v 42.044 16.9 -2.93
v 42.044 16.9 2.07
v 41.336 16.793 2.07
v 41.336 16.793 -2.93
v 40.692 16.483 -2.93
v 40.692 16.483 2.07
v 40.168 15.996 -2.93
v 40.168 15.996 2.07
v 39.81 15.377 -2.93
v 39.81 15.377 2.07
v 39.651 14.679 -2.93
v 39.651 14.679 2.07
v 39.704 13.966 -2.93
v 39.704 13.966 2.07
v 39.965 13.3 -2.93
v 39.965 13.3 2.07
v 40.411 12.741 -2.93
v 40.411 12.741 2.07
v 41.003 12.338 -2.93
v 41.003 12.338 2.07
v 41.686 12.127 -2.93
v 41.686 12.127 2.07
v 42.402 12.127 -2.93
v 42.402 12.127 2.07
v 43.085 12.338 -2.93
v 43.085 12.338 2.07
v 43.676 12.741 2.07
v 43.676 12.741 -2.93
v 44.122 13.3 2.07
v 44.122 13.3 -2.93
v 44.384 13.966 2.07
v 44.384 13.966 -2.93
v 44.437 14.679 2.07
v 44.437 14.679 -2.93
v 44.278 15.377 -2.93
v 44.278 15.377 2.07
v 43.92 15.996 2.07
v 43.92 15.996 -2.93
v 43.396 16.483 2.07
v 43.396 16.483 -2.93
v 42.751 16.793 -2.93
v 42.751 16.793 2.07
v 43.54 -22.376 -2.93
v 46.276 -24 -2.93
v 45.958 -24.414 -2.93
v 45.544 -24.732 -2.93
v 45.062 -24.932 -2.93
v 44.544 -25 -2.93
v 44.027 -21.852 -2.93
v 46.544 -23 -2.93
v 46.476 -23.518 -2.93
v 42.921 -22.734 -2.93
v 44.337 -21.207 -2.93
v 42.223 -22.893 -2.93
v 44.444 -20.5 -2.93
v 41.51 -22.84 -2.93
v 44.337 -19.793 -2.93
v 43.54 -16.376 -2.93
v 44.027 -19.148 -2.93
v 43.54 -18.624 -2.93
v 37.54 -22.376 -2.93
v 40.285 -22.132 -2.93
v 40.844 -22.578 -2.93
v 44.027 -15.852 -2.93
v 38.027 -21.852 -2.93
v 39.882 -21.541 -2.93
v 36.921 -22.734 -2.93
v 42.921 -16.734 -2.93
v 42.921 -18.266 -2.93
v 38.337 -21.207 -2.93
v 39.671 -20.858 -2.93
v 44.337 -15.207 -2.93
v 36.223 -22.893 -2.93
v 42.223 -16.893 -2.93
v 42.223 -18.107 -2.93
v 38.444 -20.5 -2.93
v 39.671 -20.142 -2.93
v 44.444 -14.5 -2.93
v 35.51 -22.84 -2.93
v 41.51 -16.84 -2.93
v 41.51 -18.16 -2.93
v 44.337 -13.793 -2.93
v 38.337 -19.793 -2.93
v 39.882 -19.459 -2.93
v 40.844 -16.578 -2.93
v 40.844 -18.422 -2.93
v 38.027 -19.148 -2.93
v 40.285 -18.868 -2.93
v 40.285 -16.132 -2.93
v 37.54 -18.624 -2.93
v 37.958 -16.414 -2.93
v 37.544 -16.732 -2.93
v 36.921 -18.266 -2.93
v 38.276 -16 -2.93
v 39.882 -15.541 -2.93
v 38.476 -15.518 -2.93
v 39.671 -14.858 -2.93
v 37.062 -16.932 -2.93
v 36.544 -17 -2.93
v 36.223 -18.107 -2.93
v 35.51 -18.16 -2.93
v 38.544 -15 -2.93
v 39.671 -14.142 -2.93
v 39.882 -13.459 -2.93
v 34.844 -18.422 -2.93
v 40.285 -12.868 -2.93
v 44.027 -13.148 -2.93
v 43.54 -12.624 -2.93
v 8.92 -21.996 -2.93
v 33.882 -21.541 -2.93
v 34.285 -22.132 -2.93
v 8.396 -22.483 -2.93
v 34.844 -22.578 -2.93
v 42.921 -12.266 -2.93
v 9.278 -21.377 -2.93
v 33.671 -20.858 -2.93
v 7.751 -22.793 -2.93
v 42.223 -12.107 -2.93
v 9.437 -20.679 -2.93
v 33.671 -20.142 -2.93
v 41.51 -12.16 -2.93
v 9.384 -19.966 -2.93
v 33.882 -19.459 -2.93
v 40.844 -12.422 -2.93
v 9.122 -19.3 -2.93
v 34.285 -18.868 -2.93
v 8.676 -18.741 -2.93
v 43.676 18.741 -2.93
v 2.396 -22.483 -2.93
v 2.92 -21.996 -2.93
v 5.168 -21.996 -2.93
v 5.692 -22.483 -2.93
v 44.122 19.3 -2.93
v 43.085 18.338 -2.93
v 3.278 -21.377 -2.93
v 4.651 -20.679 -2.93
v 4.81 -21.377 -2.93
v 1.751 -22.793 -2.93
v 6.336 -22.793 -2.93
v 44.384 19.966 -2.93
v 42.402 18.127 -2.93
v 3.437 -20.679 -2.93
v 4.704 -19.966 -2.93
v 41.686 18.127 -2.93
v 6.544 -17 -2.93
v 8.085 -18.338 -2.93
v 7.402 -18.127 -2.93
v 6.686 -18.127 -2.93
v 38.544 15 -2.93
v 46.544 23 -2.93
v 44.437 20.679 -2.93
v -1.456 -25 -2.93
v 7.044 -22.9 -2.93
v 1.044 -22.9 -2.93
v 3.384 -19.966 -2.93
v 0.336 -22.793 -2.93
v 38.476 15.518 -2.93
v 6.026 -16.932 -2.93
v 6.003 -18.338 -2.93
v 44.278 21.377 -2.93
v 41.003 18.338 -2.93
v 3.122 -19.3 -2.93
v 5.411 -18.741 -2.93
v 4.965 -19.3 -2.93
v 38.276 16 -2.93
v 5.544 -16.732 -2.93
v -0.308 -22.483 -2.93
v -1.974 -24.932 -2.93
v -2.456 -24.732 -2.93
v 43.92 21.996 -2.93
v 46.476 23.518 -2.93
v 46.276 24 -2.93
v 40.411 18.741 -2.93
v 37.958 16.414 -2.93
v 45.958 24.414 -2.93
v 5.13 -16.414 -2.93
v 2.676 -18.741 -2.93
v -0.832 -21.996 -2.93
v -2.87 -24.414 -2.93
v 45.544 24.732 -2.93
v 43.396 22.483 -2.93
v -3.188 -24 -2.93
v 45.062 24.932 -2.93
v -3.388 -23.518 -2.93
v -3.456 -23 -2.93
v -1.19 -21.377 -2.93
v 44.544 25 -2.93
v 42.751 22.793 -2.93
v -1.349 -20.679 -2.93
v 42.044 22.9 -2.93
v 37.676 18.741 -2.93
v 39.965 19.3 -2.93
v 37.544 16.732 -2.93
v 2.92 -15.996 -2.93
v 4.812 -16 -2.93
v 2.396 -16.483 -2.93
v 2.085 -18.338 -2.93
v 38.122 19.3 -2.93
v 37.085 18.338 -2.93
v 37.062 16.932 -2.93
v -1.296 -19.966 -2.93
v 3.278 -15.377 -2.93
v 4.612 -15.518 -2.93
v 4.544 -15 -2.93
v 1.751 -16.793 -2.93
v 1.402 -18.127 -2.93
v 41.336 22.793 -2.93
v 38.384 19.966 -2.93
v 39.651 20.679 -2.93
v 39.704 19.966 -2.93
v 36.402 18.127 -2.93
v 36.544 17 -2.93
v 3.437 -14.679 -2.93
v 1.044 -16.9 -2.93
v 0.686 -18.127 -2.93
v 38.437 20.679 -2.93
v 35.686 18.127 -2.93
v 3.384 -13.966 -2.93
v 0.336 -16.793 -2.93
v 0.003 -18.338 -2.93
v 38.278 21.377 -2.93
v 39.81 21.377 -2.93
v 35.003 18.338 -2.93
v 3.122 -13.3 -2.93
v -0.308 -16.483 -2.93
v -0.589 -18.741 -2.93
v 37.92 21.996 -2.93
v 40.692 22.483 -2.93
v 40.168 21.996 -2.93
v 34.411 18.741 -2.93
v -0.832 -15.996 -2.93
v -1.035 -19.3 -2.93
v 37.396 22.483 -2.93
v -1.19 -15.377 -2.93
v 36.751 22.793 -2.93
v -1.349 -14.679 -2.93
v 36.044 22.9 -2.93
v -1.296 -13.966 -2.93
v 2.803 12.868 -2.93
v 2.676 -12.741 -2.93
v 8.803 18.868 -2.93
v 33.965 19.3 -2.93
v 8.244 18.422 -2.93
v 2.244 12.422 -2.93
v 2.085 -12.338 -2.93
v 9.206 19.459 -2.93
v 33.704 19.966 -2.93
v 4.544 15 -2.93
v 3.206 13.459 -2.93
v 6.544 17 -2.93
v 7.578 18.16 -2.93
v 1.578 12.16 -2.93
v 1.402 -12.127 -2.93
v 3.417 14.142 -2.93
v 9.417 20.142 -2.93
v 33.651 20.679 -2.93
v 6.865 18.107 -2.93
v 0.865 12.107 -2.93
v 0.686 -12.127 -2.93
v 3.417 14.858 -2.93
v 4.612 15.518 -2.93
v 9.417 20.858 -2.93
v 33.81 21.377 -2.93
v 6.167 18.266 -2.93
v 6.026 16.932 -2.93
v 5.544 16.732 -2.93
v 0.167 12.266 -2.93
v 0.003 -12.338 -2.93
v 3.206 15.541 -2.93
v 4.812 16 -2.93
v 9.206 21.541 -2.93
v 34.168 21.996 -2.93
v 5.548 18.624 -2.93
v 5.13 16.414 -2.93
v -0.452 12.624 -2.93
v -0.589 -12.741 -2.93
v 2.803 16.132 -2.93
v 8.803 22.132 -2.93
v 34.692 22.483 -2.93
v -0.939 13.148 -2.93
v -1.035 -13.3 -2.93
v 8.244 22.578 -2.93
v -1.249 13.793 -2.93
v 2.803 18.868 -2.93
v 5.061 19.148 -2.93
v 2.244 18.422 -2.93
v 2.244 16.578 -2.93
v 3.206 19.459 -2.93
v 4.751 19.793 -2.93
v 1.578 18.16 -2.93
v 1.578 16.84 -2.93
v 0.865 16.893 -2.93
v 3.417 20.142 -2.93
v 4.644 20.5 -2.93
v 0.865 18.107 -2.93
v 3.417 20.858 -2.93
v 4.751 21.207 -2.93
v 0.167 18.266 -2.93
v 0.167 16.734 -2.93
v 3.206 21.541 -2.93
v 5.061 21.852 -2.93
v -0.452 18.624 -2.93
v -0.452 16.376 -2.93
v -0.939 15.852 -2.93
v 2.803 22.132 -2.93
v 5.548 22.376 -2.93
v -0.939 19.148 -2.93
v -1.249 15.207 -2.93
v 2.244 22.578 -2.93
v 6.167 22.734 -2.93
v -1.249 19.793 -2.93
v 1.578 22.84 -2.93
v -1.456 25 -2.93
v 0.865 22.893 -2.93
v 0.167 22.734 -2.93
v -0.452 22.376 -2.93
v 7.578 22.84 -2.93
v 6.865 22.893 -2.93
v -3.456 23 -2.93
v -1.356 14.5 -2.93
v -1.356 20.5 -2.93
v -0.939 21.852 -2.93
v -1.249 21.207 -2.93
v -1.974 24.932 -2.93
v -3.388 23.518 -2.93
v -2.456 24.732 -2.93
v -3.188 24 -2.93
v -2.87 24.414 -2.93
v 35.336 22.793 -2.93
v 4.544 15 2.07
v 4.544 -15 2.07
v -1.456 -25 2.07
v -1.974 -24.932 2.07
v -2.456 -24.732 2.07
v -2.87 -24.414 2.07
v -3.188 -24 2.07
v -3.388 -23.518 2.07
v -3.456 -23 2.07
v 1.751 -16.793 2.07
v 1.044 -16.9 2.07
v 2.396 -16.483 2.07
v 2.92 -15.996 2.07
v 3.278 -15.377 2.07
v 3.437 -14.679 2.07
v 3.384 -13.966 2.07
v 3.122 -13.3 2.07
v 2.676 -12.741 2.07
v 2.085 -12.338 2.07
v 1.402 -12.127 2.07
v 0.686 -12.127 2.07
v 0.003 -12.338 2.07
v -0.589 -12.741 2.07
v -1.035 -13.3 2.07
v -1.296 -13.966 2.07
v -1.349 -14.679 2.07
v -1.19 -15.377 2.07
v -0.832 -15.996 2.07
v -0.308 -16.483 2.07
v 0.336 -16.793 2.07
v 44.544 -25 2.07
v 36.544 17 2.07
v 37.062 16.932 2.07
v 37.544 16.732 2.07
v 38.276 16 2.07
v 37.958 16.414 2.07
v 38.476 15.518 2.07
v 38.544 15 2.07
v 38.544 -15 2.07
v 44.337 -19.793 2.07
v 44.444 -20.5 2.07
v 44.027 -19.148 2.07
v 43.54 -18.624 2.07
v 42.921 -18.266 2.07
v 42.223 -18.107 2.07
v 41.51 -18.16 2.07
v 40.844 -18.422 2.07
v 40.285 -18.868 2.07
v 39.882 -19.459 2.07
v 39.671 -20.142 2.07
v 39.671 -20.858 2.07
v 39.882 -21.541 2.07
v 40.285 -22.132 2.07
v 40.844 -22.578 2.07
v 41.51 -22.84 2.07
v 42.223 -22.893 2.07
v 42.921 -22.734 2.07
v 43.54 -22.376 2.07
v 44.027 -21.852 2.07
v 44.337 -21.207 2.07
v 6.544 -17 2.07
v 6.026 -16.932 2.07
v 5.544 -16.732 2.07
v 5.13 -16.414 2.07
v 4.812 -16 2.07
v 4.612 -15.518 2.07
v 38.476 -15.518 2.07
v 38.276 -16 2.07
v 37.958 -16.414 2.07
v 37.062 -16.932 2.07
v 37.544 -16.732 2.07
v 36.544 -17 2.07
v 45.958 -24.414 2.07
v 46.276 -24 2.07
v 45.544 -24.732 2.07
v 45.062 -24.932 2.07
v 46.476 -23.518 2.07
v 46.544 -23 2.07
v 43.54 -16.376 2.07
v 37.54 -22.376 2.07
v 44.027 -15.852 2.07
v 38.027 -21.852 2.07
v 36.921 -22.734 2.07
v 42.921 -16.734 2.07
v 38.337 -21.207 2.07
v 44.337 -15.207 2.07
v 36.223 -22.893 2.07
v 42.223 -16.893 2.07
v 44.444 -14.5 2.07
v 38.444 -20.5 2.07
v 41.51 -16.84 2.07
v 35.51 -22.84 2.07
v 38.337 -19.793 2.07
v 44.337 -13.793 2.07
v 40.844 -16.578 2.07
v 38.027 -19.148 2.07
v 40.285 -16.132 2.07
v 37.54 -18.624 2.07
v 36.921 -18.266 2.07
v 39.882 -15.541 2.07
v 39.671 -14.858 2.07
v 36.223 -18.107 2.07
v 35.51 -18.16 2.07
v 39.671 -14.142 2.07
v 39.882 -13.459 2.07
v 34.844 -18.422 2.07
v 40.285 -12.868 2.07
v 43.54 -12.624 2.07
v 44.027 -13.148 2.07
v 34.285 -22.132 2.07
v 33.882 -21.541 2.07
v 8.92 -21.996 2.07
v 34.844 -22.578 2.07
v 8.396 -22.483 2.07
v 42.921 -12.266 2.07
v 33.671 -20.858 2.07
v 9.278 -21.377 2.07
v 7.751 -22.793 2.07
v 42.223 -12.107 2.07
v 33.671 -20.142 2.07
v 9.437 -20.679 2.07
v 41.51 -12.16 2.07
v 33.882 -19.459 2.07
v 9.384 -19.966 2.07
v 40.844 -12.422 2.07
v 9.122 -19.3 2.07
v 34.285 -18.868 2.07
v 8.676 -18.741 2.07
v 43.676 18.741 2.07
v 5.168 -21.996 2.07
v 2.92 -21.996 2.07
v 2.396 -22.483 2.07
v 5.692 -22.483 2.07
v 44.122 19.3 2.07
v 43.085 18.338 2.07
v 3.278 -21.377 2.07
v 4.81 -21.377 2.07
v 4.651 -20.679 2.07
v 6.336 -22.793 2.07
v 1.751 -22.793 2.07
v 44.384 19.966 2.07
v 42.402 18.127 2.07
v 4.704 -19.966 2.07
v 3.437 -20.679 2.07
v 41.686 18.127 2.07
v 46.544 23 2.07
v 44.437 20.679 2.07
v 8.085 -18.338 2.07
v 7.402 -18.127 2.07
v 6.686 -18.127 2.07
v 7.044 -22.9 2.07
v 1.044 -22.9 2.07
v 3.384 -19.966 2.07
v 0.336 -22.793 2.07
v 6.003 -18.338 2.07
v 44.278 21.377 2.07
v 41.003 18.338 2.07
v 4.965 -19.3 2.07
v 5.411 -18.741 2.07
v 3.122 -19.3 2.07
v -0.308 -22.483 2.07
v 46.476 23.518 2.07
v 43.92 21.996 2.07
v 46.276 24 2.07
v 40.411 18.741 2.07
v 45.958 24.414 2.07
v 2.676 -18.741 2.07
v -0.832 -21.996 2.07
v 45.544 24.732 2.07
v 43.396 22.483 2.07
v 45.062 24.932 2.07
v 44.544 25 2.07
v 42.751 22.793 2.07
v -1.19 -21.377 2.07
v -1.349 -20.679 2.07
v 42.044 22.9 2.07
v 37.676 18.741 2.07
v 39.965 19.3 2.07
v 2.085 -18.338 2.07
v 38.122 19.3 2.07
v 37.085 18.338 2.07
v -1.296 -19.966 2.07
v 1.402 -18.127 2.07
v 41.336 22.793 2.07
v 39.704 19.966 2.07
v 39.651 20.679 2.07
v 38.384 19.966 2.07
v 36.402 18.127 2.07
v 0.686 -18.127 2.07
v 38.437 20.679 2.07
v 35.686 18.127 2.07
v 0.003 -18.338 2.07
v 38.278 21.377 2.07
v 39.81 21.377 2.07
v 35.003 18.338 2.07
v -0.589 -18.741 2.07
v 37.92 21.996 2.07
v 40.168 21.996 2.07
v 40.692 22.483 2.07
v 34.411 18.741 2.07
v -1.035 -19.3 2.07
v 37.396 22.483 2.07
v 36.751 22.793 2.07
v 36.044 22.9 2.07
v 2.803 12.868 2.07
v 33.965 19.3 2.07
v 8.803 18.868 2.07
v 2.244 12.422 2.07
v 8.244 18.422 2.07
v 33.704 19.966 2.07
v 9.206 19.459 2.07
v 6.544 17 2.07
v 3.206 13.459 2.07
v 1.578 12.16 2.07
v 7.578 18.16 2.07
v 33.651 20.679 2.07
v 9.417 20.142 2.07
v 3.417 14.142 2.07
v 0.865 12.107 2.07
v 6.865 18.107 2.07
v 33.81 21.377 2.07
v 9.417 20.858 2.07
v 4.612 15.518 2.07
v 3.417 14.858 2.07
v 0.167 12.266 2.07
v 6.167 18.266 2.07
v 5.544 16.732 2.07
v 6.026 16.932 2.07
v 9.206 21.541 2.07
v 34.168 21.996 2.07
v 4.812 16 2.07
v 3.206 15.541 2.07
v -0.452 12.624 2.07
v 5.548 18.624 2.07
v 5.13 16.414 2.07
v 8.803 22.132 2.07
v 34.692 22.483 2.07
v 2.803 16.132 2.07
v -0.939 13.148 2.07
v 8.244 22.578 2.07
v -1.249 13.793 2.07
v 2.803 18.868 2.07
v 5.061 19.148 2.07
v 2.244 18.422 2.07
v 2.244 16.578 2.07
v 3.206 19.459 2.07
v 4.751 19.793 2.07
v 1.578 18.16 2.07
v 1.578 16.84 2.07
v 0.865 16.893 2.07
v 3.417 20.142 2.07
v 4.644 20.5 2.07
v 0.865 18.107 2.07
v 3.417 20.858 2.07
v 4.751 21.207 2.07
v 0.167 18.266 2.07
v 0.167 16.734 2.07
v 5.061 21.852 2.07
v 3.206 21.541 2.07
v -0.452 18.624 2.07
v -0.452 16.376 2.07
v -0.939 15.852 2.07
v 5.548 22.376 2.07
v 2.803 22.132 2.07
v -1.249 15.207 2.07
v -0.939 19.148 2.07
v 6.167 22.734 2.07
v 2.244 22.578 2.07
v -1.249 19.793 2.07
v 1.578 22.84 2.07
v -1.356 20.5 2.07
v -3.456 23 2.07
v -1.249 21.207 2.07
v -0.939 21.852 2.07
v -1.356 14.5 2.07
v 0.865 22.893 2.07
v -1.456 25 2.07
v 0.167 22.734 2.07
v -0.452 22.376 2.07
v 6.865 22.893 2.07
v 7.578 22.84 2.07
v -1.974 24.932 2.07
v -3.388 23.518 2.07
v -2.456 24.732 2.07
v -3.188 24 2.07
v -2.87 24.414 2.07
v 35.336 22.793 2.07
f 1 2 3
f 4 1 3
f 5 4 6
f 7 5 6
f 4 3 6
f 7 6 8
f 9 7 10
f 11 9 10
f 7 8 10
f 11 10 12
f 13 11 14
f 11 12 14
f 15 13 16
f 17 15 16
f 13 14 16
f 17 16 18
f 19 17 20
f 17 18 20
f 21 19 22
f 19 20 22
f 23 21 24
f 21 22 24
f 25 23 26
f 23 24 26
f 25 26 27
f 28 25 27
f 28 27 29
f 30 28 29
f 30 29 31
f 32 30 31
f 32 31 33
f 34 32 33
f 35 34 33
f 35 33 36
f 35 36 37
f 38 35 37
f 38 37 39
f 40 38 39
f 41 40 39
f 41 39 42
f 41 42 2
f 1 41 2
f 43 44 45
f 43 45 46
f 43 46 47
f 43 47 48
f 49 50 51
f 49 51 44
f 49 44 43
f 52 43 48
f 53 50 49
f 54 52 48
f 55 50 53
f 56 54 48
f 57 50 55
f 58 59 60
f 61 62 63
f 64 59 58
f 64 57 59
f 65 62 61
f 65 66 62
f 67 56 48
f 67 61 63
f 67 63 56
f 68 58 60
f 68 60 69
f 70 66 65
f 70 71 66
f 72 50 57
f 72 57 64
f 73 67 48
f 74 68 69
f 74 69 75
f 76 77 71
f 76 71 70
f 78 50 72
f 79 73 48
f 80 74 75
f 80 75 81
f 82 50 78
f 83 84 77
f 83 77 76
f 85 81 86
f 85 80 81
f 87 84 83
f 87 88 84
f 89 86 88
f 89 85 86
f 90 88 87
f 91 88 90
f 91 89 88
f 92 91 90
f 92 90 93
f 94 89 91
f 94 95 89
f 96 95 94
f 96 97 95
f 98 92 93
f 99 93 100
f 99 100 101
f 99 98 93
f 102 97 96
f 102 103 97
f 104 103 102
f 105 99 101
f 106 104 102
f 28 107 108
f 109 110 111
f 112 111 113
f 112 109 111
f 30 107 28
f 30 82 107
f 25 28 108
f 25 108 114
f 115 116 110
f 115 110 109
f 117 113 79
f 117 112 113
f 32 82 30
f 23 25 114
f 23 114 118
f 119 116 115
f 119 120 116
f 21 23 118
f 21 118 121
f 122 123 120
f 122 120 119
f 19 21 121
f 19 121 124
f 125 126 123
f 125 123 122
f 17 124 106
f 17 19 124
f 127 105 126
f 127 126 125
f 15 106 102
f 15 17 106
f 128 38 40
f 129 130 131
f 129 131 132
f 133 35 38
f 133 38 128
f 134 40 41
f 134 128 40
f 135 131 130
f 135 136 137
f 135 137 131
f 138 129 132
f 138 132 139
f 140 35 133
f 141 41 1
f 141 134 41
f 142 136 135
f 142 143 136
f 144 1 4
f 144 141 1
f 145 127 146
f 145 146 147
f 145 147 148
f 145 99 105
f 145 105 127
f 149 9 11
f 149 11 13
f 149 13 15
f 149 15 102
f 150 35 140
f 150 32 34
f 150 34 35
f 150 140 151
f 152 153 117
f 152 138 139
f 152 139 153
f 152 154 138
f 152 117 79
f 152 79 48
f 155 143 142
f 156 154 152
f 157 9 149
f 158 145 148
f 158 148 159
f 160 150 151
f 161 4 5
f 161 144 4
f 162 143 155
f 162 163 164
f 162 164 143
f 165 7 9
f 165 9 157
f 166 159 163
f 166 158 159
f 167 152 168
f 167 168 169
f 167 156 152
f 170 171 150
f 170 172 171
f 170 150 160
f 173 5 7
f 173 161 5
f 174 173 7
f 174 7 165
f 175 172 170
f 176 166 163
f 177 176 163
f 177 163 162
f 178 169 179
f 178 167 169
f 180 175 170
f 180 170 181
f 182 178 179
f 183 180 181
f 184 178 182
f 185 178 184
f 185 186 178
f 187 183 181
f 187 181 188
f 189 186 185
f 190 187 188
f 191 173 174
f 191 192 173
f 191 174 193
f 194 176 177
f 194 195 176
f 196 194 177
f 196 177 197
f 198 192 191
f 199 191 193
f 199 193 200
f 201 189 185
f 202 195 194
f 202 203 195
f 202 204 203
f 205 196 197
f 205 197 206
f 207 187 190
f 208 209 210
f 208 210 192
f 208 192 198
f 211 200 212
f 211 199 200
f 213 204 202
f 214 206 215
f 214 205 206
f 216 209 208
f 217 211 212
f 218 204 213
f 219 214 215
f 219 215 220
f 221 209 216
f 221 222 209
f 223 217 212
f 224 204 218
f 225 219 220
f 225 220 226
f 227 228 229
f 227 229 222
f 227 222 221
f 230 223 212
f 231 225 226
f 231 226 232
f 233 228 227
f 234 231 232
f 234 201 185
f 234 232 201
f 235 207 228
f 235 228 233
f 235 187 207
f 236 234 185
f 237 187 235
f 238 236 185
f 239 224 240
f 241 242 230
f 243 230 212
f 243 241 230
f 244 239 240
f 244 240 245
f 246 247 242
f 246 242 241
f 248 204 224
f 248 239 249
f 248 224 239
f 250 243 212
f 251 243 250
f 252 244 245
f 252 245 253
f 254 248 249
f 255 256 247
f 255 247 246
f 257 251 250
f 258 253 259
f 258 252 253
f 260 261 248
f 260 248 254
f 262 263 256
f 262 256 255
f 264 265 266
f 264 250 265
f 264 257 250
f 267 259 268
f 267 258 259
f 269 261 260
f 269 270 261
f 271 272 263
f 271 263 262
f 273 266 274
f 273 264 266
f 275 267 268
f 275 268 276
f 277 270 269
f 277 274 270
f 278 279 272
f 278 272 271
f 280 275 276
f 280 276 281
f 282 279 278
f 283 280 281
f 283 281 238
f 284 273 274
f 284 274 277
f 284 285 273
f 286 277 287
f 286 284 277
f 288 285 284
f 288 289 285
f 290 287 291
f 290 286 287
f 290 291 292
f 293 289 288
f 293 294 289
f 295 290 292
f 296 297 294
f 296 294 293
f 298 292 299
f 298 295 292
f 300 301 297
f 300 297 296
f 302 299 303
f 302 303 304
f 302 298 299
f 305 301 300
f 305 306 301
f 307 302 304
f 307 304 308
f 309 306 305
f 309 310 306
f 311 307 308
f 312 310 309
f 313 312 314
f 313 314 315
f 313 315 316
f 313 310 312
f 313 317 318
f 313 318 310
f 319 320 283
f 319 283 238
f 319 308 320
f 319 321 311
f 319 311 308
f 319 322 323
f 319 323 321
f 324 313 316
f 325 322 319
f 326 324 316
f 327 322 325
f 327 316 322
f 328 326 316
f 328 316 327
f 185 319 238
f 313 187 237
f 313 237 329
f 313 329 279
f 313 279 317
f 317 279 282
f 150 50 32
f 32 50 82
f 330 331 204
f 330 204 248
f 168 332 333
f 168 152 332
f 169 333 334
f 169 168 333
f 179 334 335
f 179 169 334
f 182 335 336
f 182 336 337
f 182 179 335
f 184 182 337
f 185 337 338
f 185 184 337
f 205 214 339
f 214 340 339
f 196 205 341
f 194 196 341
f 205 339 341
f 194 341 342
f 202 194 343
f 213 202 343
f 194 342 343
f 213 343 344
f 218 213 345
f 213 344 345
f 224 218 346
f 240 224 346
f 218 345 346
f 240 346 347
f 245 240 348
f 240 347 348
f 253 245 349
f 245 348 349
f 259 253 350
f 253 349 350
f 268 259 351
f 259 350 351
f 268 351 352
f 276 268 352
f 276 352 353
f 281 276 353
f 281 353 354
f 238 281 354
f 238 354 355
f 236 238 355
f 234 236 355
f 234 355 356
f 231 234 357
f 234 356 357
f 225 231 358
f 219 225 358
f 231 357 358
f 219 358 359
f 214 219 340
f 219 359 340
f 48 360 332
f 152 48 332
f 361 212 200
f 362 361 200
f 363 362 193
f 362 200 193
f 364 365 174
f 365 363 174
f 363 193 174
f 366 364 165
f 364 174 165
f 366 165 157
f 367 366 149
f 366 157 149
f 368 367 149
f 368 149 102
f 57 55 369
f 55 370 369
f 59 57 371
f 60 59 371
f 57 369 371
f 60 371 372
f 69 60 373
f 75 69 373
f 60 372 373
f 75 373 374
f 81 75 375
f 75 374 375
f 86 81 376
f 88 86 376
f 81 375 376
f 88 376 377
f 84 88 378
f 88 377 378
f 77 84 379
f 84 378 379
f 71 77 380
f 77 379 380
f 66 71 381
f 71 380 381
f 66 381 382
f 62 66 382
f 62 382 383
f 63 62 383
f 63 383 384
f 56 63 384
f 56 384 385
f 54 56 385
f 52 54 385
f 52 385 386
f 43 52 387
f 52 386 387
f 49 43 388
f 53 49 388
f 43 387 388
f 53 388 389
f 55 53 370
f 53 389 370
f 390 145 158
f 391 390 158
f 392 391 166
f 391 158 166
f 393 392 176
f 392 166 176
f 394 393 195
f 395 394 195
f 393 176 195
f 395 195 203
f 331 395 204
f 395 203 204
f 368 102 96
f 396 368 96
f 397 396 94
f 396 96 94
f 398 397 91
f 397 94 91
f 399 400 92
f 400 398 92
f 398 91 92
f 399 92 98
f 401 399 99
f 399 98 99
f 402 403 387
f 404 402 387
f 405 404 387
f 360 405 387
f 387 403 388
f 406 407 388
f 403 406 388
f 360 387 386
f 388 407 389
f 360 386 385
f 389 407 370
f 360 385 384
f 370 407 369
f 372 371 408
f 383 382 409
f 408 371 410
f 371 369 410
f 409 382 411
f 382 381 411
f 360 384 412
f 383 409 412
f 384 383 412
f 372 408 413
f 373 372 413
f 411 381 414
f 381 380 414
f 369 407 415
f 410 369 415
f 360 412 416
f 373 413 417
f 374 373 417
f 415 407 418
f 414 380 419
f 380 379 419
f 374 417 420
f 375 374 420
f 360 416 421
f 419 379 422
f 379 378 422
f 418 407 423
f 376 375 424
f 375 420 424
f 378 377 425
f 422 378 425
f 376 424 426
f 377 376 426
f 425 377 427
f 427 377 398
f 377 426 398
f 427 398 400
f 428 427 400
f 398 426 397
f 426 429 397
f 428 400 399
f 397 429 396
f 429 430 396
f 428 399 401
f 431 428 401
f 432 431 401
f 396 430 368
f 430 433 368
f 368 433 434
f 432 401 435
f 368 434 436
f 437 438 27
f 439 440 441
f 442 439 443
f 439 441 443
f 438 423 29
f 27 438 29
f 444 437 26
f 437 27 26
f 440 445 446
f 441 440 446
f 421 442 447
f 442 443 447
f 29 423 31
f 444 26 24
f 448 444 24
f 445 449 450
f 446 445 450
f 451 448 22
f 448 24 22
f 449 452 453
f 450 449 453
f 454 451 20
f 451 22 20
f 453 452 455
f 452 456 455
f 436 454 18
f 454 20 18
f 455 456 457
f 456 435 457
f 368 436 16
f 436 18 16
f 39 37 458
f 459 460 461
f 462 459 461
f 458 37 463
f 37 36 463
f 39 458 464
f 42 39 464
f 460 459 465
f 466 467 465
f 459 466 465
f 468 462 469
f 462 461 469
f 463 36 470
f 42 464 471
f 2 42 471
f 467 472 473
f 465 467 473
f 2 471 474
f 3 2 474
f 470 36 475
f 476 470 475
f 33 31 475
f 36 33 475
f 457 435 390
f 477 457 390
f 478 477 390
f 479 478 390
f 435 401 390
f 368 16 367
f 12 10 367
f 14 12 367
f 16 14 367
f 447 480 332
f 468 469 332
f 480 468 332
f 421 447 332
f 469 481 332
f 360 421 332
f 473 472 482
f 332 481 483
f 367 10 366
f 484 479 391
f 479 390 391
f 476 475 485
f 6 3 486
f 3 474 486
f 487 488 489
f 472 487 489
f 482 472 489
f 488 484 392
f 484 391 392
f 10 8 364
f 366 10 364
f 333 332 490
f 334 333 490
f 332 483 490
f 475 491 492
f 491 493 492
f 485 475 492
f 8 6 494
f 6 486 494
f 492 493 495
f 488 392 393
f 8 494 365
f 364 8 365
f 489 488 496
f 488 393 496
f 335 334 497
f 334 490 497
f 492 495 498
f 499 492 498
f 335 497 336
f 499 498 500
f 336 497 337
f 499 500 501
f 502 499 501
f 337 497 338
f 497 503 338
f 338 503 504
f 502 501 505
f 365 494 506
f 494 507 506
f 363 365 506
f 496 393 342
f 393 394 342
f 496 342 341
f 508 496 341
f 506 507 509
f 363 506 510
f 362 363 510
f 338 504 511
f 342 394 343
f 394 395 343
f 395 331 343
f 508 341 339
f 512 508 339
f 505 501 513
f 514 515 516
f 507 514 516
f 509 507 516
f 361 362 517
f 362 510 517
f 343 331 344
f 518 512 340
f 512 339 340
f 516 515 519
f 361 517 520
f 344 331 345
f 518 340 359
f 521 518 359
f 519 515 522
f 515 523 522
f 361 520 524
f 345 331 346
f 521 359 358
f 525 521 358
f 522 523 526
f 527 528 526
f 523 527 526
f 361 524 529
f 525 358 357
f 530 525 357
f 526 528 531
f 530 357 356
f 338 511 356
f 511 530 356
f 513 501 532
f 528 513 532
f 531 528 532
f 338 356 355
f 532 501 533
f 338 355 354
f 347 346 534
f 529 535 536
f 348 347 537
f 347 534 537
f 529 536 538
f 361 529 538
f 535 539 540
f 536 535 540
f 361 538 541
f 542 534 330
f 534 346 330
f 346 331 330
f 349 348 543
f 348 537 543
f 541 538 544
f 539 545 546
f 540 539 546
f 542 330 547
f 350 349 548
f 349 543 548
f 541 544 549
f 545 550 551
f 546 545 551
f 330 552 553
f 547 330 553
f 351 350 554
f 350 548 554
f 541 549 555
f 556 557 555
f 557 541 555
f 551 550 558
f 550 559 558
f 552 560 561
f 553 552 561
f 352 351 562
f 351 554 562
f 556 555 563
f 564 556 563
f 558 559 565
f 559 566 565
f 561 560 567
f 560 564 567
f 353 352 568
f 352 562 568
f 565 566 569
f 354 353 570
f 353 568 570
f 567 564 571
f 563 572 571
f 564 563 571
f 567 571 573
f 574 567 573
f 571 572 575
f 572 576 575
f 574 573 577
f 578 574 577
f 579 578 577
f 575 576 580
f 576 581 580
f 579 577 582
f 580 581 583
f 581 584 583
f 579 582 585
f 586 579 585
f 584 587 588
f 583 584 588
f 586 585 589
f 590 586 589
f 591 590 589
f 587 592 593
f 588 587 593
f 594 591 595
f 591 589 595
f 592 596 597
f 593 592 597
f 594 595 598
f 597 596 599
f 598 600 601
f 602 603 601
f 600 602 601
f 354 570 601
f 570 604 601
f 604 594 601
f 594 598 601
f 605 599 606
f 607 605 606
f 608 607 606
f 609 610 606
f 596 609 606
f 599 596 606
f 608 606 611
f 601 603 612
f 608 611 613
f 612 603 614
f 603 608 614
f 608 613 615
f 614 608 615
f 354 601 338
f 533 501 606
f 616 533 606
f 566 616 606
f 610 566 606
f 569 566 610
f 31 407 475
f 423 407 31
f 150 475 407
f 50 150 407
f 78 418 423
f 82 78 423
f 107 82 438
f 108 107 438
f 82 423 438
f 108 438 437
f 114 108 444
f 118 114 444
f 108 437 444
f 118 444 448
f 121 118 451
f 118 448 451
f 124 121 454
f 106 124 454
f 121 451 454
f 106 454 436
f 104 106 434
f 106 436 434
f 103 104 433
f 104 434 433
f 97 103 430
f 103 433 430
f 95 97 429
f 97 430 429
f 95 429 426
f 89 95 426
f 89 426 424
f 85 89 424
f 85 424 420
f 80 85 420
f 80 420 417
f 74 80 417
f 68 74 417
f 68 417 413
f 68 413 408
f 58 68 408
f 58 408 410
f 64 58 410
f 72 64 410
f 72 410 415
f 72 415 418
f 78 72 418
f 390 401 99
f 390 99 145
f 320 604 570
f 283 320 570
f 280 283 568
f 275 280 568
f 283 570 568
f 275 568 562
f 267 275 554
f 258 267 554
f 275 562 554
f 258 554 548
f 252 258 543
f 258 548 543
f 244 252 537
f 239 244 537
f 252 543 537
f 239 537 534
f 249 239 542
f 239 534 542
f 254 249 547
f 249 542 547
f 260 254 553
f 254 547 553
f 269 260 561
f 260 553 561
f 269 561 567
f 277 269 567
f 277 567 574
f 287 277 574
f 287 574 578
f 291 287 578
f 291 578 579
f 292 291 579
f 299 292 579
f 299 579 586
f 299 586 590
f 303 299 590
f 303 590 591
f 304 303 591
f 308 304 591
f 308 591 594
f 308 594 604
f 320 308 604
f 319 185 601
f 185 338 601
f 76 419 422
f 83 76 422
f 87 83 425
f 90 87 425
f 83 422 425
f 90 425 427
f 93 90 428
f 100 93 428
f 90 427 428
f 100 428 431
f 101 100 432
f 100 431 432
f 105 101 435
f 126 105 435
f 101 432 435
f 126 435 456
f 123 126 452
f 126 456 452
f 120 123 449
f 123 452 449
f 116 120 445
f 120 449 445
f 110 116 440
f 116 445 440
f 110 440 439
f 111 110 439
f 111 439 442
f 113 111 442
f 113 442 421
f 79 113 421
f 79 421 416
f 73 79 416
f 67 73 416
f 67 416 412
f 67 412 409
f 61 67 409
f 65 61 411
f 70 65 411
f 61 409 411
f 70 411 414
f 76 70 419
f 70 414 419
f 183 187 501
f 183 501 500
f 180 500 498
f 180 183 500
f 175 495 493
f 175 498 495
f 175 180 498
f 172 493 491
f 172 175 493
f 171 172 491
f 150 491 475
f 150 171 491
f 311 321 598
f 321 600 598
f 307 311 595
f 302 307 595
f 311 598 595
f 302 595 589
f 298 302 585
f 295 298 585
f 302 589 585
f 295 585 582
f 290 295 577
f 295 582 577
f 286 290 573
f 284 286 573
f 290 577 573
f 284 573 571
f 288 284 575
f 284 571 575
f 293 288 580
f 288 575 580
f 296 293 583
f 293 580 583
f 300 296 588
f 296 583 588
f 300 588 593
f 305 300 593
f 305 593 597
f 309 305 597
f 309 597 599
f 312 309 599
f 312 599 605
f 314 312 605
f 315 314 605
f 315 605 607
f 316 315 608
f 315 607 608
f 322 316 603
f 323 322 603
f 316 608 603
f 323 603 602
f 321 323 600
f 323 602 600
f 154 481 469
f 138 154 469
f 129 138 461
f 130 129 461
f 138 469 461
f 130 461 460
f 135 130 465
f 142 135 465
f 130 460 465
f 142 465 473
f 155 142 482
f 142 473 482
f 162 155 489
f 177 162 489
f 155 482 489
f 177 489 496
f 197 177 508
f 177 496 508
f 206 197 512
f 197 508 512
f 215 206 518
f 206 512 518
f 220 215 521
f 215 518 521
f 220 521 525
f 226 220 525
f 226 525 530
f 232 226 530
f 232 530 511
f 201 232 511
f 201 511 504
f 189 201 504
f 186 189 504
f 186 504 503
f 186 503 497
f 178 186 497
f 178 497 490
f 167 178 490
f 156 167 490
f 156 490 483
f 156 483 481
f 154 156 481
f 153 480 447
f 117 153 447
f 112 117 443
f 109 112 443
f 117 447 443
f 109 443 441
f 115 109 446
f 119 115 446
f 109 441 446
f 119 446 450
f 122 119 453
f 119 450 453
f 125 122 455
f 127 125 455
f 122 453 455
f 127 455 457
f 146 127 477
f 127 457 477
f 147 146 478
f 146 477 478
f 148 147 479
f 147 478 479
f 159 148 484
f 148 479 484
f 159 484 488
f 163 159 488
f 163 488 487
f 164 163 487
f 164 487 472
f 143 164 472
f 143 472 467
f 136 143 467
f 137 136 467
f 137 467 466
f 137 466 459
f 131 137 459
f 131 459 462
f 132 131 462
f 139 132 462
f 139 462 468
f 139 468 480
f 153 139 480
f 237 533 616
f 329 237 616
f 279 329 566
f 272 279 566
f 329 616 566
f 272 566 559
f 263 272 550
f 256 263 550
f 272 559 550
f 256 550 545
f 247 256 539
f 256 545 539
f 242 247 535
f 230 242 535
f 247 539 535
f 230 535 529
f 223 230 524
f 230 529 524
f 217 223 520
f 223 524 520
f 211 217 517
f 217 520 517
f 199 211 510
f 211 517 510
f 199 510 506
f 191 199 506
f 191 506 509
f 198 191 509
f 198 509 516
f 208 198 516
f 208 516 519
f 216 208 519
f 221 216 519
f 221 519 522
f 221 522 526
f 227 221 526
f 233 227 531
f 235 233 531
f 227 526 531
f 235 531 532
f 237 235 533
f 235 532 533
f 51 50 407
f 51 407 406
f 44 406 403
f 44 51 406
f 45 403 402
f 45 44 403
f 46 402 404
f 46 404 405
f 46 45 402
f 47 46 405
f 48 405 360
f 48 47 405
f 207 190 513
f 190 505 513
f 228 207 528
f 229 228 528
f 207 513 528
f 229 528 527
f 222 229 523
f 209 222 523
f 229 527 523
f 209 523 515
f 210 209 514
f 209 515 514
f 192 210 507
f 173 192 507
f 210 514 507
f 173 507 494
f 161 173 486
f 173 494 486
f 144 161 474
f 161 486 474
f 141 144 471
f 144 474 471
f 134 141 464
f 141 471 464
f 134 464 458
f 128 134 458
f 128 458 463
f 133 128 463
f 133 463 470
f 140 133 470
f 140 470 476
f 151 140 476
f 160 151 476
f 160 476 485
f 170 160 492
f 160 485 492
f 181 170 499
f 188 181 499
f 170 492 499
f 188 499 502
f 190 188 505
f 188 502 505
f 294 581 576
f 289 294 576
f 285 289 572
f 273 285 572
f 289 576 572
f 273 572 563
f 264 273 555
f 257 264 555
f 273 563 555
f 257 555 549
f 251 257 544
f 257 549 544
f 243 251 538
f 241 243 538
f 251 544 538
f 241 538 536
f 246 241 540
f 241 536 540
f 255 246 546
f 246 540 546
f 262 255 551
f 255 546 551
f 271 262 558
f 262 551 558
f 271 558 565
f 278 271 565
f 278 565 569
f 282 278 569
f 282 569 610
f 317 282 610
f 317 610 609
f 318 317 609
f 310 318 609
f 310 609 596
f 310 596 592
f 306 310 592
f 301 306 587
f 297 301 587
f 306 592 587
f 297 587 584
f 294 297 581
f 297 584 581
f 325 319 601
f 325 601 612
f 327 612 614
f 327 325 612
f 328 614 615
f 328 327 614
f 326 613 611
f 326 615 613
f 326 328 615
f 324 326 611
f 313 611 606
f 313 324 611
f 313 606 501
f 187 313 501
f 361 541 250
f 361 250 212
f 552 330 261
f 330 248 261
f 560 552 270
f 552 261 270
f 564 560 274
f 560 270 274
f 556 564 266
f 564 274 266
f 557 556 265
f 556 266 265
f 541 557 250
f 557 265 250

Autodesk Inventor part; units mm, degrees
ref_plane "YZ Plane" through (0, 0, 0) normal (1, 0, 0) x (0, 1, 0)
ref_plane "XZ Plane" through (0, 0, 0) normal (0, 1, 0) x (-1, 0, 0)
ref_plane "XY Plane" through (0, 0, 0) normal (0, 0, 1) x (1, 0, 0)
ref_plane "Arbeitsebene1" through (21.5439, 0, 2.0695) normal (0, 0, -1) x (-1, 0, 0)
sketch "Skizze1" plane through (21.5439, 0, 2.0695) normal (0, 0, -1) x (-1, 0, 0)
  line L0 (-25, -25) -> (25, -25)
  line L1 (25, -25) -> (25, 25)
  line L2 (25, 25) -> (-25, 25)
  line L3 (-25, 25) -> (-25, -25)
  line L4 (-25, -25) -> (25, 25) construction
  line L5 (25, -25) -> (-25, 25) construction
  line L6 (-17, -17) -> (17, -17)
  line L7 (17, -17) -> (17, 17)
  line L8 (17, 17) -> (-17, 17)
  line L9 (-17, 17) -> (-17, -17)
  line L10 (-17, -17) -> (17, 17) construction
  line L11 (17, -17) -> (-17, 17) construction
  point P0 (21.5439, 0)
  point P1 (0, 0)
  point P2 (0, 0)
  dimension "d0" = 50
  dimension "d1" = 50
  dimension "d2" = 34
  dimension "d3" = 34
extrude "Extrusion1" add sketch "Skizze1" along normal blind 5
sketch "Skizze2" plane through (21.5439, 0, -2.9305) normal (0, 0, -1) x (-1, 0, 0)
  line L0 (21, 17) -> (21, -17) projected
  line L1 (25, -25) -> (25, 25) projected
  line L2 (25, 25) -> (-25, 25) projected
  line L3 (-25, 25) -> (-25, -25) projected
  line L4 (-25, -25) -> (25, -25) projected
  line L5 (-17, -17) -> (-17, 17) projected
  line L6 (-17, 17) -> (17, 17) projected
  line L7 (17, 17) -> (17, -17) projected
  line L8 (17, -17) -> (-17, -17) projected
  line L9 (20.5, -20.5) -> (-20.5, -20.5)
  line L10 (-20.5, -20.5) -> (-20.5, 20.5)
  line L11 (-20.5, 20.5) -> (20.5, 20.5)
  line L12 (20.5, 20.5) -> (20.5, -20.5)
  line L13 (20.5, -20.5) -> (-20.5, 20.5) construction
  line L14 (-20.5, -20.5) -> (20.5, 20.5) construction
  point P0 (21.5439, 0)
  point P1 (0, 0)
  point P2 (-14.5, 20.5)
  point P3 (-20.5, 14.5)
  dimension "d6" = 41
  dimension "d7" = 41
  dimension "d_pin" = 14.5
  dimension "d10" = 14.5
hole "Bohrung1" at (36.0439, 20.5, -2.9305) at (42.0439, 14.5, -2.9305) at (42.0439, 20.5, -2.9305) direction (0, 0, 1) diameter 4.8 end through all
ref_plane "Arbeitsebene2" through (21.5439, -25, 2.0695) normal (1, 0, 0) x (0, 0, -1)
ref_plane "Arbeitsebene3" through (-3.4561, 0, 2.0695) normal (0, -1, 0) x (1, 0, 0)
pattern_circular "Runde Anordnung1" count 4 over 360 about axis through (21.5439, 0, 2.0695) along (0, 0, 1) of "Bohrung1"
fillet "Rundung1" radius 2 8 edges at (38.5439, 17, -0.4305) (38.5439, -17, -0.4305) (4.5439, -17, -0.4305) (4.5439, 17, -0.4305) (-3.4561, 25, -0.4305) (-3.4561, -25, -0.4305) (46.5439, -25, -0.4305) (46.5439, 25, -0.4305)
equation "\"d10\" = d_pin"
properties part number "10_Base_v4"
